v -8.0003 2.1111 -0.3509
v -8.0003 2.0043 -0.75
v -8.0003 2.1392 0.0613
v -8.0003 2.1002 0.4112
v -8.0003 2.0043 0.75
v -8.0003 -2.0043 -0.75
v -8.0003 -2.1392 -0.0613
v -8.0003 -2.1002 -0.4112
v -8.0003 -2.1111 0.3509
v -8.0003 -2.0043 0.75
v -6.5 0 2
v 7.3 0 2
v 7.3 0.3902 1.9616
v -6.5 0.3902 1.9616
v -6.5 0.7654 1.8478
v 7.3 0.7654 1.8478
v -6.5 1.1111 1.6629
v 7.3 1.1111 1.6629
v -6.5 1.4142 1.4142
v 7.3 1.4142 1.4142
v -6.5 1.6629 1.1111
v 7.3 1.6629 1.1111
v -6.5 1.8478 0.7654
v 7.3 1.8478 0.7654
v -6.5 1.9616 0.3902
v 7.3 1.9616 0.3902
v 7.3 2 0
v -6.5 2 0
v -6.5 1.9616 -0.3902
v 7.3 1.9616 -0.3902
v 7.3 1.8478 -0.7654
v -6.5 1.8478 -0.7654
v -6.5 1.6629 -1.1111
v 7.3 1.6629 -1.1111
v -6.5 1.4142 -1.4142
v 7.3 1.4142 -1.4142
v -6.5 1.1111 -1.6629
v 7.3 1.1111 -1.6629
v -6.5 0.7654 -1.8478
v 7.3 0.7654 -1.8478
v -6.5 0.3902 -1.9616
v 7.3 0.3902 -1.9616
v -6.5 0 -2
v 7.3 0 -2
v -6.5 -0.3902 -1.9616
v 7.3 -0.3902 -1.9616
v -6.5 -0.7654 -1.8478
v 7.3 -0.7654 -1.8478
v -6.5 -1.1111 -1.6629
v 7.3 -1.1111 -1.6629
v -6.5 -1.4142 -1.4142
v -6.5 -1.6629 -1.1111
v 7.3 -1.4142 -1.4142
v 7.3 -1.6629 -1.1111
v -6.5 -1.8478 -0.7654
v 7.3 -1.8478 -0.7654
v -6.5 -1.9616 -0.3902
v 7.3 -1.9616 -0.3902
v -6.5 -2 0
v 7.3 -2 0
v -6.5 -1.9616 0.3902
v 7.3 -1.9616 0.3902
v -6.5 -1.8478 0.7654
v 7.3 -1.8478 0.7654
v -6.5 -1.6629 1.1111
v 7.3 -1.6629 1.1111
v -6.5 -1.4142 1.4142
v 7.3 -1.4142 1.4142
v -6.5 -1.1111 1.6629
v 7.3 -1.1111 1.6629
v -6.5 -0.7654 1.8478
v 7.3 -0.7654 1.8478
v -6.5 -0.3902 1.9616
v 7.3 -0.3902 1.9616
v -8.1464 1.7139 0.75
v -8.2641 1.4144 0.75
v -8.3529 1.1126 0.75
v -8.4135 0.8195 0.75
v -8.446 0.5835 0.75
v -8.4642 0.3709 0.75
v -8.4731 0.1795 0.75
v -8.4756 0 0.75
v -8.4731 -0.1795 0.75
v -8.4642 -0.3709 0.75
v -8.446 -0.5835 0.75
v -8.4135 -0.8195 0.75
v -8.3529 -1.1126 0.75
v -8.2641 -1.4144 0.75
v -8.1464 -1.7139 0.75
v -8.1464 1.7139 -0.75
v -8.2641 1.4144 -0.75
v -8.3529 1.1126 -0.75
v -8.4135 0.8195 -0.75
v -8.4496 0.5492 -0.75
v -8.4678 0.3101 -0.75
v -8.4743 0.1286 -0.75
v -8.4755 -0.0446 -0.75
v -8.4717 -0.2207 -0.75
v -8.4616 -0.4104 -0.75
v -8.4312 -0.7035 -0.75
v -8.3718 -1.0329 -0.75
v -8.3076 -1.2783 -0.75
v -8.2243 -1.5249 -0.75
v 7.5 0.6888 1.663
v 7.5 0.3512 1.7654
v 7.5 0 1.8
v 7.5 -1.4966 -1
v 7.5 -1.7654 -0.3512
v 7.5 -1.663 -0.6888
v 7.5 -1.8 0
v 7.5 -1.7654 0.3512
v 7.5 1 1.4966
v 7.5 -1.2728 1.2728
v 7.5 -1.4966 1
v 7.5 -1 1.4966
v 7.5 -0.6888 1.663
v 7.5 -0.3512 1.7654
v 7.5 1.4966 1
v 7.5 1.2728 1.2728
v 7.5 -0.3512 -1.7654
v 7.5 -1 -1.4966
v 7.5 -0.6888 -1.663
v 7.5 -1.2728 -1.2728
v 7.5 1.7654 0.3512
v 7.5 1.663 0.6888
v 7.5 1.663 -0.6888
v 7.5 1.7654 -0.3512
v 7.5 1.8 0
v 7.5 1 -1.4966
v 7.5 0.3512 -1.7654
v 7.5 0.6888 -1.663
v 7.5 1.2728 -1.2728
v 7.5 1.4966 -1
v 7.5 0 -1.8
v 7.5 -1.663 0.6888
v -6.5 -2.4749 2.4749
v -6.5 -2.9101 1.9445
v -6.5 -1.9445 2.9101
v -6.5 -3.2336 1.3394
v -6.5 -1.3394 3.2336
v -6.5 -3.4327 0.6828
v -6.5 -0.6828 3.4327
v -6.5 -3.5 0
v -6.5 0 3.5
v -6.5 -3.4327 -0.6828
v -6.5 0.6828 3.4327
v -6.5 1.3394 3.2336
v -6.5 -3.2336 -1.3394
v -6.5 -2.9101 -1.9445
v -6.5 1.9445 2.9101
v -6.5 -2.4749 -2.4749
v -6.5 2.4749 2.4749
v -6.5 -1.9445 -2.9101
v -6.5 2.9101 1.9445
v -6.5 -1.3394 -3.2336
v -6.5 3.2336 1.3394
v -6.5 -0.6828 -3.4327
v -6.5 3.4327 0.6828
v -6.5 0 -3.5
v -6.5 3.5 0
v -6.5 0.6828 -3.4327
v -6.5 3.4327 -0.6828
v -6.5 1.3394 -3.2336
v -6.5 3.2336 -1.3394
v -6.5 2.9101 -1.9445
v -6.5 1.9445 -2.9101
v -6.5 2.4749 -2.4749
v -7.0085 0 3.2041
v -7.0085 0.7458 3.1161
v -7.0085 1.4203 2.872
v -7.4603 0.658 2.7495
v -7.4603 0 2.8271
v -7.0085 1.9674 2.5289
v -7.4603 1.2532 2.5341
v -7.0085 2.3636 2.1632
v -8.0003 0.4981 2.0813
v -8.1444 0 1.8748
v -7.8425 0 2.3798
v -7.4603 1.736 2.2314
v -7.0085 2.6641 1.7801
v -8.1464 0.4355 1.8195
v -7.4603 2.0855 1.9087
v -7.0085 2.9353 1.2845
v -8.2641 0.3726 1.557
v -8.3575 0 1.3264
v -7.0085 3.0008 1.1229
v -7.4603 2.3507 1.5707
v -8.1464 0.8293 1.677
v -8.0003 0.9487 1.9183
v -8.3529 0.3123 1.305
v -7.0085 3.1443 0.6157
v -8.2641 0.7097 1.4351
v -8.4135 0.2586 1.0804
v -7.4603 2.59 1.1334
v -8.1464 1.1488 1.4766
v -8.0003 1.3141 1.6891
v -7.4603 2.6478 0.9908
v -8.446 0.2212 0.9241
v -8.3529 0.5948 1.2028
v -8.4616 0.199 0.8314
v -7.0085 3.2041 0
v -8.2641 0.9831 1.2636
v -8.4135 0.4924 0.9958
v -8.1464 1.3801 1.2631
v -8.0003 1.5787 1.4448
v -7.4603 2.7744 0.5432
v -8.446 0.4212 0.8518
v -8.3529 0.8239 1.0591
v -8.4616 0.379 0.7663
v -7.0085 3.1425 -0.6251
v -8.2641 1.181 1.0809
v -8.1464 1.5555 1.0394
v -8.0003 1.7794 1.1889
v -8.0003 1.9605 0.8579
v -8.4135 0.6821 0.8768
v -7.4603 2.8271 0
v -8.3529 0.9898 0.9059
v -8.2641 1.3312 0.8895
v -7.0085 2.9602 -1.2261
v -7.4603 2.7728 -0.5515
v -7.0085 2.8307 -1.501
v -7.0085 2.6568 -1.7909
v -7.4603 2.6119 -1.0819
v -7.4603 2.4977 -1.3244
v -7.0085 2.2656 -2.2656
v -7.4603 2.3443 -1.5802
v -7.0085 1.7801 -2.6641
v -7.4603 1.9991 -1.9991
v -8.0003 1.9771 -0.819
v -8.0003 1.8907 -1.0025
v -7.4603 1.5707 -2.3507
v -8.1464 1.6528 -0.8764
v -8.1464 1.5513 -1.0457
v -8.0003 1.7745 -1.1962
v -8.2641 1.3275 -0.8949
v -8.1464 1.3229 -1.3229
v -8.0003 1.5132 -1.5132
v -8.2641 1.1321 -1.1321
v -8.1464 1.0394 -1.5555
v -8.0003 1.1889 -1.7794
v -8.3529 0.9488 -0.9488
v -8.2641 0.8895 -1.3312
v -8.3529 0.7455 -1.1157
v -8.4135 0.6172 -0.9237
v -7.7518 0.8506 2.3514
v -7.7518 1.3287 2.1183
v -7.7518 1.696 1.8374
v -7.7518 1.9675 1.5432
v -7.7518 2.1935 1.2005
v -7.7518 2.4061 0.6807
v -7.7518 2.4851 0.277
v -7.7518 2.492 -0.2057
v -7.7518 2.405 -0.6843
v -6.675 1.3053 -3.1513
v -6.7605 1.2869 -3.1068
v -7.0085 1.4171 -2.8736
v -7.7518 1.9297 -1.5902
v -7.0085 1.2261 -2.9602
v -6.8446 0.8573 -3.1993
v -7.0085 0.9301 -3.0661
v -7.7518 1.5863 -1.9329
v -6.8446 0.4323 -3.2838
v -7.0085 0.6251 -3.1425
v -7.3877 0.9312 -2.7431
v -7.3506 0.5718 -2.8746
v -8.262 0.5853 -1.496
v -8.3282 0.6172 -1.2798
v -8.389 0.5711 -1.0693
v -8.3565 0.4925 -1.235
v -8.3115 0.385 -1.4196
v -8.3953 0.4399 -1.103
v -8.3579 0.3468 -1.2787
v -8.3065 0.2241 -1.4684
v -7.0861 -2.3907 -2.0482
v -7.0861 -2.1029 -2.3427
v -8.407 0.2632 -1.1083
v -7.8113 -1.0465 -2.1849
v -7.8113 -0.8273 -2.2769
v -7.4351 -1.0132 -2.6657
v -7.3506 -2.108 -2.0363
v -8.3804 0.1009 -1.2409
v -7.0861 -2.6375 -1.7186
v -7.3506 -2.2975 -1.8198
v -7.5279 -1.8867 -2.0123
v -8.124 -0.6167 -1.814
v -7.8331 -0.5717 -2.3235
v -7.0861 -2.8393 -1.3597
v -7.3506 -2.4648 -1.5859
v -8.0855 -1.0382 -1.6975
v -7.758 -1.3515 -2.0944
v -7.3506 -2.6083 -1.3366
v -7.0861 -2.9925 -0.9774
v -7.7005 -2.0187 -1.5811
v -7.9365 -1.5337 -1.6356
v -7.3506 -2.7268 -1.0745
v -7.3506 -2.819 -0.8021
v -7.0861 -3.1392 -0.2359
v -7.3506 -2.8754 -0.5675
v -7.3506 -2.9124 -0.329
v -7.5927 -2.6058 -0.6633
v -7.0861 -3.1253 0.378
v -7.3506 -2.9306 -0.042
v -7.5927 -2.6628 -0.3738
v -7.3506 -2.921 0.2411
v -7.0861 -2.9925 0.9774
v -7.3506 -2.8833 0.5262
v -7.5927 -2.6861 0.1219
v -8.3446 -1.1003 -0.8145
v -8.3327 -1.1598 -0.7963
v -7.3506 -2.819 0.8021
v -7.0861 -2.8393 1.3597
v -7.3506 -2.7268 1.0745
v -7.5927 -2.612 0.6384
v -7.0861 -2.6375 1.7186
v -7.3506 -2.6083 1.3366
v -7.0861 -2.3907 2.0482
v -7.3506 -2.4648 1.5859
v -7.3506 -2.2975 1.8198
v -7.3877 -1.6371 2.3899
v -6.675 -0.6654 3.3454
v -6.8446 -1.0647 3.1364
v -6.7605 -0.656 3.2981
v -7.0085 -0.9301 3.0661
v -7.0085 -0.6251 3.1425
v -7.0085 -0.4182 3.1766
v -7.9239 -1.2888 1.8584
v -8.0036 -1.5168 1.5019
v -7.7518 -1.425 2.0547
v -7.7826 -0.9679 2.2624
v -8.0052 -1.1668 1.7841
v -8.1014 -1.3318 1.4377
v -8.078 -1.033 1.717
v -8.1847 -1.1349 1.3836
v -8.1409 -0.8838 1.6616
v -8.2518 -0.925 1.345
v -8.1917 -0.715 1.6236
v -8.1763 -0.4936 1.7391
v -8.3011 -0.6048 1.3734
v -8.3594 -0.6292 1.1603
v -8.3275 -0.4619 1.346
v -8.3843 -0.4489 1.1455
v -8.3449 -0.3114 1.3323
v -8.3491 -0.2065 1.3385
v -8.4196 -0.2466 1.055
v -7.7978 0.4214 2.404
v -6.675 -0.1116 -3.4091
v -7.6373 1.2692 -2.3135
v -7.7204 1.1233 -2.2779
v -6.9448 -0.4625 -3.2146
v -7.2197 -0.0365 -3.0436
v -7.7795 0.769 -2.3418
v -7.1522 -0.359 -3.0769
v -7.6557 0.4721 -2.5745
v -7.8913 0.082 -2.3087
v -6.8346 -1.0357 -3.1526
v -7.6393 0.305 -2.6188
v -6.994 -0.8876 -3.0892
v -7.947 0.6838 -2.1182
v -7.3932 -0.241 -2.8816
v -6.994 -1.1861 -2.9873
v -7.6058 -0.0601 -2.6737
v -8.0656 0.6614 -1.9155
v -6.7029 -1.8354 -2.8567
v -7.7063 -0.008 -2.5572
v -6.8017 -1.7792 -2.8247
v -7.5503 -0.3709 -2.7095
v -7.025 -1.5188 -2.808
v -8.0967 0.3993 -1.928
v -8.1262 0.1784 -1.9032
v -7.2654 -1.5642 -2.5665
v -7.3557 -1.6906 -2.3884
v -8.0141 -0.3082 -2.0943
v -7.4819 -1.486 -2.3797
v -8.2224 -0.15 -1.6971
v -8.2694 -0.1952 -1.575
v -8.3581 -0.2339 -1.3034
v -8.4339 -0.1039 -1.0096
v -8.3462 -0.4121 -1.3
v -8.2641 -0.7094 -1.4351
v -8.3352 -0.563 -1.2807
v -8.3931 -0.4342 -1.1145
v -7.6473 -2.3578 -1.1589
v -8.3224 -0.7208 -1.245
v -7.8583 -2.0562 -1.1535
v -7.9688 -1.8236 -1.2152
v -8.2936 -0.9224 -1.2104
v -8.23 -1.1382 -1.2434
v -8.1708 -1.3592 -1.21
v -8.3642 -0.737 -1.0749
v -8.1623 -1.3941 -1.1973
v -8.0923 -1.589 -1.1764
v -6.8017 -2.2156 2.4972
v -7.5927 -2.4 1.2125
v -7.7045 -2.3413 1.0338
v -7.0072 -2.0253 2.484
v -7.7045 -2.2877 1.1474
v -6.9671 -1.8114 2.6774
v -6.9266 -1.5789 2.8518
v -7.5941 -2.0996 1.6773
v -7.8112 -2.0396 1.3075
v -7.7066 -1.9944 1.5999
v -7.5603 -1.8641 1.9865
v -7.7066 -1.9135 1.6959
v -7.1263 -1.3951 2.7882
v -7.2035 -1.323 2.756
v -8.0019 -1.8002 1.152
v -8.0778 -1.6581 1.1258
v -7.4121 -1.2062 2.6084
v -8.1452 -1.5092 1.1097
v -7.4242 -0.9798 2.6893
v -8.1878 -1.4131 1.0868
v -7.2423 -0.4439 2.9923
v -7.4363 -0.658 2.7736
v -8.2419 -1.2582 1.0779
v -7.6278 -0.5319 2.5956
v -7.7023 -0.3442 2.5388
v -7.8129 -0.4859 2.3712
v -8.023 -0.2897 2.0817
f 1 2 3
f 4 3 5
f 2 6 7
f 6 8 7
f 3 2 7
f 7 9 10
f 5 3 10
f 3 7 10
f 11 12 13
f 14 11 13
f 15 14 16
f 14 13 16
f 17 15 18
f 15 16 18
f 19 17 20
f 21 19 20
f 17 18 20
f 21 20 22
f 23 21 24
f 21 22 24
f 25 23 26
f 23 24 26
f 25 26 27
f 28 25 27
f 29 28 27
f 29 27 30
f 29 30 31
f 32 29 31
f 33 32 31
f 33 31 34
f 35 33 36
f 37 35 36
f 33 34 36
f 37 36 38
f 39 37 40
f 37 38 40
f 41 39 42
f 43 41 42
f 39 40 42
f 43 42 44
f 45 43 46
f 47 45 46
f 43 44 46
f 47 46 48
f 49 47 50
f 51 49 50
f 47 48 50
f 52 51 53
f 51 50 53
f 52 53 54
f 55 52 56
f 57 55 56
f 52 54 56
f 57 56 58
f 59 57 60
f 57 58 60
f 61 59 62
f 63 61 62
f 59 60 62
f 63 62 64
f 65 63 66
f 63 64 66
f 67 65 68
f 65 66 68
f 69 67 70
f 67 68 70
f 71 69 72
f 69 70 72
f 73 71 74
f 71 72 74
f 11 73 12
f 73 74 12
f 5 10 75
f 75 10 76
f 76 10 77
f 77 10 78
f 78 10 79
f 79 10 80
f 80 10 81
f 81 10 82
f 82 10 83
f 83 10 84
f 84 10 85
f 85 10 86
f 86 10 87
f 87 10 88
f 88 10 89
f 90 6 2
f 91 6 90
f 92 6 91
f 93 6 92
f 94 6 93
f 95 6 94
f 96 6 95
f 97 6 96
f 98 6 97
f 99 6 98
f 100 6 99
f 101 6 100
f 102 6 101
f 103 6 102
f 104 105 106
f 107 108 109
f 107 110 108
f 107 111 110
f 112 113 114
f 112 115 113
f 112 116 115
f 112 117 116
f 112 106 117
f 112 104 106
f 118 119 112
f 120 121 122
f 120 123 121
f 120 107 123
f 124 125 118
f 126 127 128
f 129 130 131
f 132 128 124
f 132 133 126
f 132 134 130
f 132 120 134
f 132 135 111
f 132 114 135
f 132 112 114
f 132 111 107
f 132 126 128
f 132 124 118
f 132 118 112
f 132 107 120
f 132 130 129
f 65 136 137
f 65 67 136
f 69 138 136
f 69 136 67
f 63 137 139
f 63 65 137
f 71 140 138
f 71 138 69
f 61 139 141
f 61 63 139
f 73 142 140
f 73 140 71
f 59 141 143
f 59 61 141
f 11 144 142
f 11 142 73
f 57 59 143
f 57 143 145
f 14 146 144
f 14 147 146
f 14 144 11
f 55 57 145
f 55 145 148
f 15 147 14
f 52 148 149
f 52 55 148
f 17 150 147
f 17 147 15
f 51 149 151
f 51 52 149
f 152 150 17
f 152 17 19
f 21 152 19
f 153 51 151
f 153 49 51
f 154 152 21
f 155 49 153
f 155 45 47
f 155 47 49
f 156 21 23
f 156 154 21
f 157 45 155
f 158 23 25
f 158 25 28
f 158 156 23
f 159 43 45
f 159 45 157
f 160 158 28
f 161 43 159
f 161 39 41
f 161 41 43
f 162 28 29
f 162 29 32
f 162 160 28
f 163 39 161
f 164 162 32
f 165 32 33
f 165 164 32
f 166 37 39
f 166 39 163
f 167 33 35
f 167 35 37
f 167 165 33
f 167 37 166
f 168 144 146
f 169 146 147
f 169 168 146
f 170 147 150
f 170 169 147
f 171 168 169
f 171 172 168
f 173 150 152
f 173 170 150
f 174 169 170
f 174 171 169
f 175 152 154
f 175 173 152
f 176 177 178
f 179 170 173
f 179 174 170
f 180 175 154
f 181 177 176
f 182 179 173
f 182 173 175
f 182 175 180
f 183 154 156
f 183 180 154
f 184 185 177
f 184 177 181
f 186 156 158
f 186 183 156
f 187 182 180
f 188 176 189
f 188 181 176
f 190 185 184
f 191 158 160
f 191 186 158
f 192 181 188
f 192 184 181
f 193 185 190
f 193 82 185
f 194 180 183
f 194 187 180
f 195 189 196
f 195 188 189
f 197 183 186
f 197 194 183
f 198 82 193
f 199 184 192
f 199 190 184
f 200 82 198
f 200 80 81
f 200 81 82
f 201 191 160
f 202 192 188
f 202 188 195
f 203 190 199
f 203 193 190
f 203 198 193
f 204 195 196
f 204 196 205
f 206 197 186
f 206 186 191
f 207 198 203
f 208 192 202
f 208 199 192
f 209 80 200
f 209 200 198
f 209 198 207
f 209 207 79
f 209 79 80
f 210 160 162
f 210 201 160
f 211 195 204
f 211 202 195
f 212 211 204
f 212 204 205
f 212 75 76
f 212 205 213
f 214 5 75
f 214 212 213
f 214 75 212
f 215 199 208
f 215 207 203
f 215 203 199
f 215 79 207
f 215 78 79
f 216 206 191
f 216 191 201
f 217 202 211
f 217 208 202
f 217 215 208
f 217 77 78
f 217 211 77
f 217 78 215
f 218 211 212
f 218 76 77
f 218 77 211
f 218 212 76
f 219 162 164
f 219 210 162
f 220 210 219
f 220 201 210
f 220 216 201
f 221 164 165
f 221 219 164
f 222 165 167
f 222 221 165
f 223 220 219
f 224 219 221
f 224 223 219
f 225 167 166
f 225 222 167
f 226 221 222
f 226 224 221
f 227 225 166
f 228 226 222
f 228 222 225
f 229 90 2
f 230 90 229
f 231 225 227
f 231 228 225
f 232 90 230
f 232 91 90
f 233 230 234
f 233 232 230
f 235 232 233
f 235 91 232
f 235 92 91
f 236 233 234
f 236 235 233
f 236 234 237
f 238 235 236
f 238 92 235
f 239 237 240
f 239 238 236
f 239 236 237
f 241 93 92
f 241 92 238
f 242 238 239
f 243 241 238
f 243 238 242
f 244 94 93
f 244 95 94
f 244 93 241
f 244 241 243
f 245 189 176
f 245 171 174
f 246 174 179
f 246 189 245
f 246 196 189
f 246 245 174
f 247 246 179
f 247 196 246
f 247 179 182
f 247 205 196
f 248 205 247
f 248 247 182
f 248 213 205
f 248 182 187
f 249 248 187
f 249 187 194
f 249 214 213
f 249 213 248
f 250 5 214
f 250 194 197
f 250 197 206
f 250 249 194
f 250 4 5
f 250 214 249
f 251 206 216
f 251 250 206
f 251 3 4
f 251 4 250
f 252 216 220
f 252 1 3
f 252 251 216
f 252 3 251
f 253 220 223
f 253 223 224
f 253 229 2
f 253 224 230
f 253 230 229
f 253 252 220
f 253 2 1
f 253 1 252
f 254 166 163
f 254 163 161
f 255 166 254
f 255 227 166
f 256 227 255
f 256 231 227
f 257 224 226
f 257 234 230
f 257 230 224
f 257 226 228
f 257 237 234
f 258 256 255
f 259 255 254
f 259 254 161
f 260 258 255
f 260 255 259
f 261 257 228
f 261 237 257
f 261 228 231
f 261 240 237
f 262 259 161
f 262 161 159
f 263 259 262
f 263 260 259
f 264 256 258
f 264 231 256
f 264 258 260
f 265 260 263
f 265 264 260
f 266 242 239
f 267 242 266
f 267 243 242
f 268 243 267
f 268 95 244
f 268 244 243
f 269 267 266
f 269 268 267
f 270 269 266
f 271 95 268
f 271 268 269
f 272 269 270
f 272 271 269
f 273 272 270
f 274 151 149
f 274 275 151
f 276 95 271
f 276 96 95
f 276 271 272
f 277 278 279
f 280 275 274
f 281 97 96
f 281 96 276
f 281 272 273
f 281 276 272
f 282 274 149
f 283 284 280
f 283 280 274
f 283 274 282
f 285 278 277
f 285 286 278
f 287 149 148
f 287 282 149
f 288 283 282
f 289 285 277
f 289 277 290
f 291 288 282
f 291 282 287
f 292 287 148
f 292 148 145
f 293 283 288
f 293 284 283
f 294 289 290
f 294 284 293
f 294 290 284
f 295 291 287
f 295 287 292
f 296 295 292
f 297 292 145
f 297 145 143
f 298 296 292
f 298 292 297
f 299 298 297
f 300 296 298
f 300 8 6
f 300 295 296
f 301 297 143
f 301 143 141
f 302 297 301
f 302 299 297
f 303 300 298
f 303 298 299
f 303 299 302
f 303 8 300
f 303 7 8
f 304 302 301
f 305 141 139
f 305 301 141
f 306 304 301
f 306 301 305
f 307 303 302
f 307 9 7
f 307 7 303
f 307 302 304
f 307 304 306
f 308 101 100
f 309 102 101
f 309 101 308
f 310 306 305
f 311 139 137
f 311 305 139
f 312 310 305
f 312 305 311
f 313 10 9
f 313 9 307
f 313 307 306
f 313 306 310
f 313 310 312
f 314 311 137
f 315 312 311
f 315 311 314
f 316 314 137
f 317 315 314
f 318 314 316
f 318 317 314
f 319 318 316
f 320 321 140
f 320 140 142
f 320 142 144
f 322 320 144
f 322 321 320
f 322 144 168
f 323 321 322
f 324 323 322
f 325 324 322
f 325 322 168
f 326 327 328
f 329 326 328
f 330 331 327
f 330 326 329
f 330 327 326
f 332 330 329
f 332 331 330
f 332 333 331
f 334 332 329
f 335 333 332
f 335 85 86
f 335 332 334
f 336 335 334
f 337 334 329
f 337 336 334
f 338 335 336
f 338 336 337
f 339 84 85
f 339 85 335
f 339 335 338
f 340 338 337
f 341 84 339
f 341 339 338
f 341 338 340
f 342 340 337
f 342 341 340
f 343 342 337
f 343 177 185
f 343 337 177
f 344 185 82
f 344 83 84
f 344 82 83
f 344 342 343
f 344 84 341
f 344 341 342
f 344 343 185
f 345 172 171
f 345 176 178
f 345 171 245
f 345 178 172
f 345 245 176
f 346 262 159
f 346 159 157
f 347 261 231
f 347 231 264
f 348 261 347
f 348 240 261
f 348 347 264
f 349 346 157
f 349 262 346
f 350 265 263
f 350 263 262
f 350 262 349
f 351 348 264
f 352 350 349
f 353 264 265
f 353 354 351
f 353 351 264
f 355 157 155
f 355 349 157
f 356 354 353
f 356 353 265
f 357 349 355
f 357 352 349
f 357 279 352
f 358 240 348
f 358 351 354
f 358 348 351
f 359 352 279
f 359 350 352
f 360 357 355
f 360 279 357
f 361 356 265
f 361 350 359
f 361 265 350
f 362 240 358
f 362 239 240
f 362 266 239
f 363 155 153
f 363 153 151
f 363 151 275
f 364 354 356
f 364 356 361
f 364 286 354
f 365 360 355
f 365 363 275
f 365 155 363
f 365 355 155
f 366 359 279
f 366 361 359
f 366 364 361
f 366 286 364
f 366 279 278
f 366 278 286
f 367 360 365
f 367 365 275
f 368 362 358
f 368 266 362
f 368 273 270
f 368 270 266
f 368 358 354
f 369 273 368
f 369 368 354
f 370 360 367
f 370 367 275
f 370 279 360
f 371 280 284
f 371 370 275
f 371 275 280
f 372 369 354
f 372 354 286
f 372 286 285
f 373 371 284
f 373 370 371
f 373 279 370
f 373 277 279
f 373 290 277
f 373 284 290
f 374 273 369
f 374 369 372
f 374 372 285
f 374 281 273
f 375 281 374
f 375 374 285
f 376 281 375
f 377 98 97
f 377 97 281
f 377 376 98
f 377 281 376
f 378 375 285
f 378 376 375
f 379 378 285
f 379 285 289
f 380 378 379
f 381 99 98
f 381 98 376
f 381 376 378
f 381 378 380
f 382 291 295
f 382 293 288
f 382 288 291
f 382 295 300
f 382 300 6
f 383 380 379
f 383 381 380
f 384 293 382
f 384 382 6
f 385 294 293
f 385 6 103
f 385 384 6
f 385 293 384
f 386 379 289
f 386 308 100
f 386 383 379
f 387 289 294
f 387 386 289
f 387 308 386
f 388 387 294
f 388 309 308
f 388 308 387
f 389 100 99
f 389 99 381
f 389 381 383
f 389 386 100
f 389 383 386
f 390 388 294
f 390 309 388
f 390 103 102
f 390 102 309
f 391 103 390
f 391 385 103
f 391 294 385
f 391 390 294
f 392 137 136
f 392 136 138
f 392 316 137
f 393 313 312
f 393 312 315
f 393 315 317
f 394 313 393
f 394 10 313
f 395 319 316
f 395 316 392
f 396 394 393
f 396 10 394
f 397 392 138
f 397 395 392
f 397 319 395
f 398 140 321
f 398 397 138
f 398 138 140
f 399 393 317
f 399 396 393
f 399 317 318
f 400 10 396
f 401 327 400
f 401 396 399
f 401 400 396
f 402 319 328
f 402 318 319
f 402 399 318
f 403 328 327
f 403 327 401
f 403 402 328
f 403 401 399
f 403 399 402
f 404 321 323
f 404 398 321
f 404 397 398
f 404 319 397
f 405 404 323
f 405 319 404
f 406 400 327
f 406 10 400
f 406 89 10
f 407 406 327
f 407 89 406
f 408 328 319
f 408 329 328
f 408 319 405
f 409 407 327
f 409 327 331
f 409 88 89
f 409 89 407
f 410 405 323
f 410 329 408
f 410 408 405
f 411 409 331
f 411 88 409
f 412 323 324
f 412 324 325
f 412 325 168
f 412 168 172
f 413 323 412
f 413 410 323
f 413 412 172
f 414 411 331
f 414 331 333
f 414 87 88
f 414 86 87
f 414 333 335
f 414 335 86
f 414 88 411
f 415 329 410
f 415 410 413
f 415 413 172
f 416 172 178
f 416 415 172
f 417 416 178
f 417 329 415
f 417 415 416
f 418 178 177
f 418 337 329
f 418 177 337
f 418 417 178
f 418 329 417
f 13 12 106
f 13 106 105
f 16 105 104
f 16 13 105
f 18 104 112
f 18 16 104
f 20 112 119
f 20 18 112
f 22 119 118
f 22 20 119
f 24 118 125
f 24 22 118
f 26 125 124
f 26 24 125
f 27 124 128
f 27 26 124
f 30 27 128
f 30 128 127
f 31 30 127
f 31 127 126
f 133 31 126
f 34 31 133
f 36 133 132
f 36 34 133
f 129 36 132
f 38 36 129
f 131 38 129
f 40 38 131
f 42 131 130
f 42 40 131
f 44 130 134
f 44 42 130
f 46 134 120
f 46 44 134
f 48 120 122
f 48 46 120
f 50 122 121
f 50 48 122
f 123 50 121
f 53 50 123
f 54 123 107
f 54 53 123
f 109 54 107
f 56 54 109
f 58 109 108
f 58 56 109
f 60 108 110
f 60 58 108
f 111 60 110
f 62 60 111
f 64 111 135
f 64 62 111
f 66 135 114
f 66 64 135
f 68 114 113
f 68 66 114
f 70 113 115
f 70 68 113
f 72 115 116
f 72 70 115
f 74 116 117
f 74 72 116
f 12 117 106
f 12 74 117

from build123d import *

# Parameters (mm, degrees)
F0_W     = 14
F0_H     = 2
F3_SIZE  = 0.2
F4_W     = 1.125
F4_H     = 1.5
F5_DEPTH = 15


# Not quite as in the source:
# - a fillet or chamfer that OpenCascade refuses, or shapes differently, is made with other operations: its cross-section is extruded or revolved along the edge and cut away or added


with BuildPart() as f1:
    # F0 (on Front) → F1 (revolve)
    with BuildSketch(Plane.XZ):
        with Locations((0.5, 1)):
            Rectangle(F0_W, F0_H)
        Polygon((-8.5, 0), (-6.5, 0), (-6.5, 2), (-6.5, 3.5), (-8.5, 3.5), align=None)
    revolve(axis=Axis((-0.5, 0, 0), (-1, 0, 0)))

    # F2: fillet of radius 3.5 on 1 edges, made by hand

    # F2_s1 → F2_t2 (revolve, cut)
    with BuildSketch(Plane.XZ):
        with BuildLine():
            ThreePointArc((-6.5, 3.5), (-7.9580398915, 2.2085510332), (-8.5, 0.3377223398))
            Line((-8.5, 0.3377223398), (-8.5, 3.5))
            Line((-8.5, 3.5), (-6.5, 3.5))
        make_face()
    revolve(axis=Axis((-8.5, 0, 0), (-1, 0, 0)), mode=Mode.SUBTRACT)

    # F3
    f3_edges = [f1.edges().sort_by_distance(p)[0] for p in [
        (7.5, 0, -2),
    ]]
    chamfer(f3_edges, length=F3_SIZE)

    # F4 (on face) → F5 (cut, symmetric)
    with BuildSketch(Plane.XZ):
        with Locations((-8.5627762601, 0)):
            Rectangle(F4_W, F4_H)
    extrude(amount=F5_DEPTH, both=True, mode=Mode.SUBTRACT)


solid = f1.part
